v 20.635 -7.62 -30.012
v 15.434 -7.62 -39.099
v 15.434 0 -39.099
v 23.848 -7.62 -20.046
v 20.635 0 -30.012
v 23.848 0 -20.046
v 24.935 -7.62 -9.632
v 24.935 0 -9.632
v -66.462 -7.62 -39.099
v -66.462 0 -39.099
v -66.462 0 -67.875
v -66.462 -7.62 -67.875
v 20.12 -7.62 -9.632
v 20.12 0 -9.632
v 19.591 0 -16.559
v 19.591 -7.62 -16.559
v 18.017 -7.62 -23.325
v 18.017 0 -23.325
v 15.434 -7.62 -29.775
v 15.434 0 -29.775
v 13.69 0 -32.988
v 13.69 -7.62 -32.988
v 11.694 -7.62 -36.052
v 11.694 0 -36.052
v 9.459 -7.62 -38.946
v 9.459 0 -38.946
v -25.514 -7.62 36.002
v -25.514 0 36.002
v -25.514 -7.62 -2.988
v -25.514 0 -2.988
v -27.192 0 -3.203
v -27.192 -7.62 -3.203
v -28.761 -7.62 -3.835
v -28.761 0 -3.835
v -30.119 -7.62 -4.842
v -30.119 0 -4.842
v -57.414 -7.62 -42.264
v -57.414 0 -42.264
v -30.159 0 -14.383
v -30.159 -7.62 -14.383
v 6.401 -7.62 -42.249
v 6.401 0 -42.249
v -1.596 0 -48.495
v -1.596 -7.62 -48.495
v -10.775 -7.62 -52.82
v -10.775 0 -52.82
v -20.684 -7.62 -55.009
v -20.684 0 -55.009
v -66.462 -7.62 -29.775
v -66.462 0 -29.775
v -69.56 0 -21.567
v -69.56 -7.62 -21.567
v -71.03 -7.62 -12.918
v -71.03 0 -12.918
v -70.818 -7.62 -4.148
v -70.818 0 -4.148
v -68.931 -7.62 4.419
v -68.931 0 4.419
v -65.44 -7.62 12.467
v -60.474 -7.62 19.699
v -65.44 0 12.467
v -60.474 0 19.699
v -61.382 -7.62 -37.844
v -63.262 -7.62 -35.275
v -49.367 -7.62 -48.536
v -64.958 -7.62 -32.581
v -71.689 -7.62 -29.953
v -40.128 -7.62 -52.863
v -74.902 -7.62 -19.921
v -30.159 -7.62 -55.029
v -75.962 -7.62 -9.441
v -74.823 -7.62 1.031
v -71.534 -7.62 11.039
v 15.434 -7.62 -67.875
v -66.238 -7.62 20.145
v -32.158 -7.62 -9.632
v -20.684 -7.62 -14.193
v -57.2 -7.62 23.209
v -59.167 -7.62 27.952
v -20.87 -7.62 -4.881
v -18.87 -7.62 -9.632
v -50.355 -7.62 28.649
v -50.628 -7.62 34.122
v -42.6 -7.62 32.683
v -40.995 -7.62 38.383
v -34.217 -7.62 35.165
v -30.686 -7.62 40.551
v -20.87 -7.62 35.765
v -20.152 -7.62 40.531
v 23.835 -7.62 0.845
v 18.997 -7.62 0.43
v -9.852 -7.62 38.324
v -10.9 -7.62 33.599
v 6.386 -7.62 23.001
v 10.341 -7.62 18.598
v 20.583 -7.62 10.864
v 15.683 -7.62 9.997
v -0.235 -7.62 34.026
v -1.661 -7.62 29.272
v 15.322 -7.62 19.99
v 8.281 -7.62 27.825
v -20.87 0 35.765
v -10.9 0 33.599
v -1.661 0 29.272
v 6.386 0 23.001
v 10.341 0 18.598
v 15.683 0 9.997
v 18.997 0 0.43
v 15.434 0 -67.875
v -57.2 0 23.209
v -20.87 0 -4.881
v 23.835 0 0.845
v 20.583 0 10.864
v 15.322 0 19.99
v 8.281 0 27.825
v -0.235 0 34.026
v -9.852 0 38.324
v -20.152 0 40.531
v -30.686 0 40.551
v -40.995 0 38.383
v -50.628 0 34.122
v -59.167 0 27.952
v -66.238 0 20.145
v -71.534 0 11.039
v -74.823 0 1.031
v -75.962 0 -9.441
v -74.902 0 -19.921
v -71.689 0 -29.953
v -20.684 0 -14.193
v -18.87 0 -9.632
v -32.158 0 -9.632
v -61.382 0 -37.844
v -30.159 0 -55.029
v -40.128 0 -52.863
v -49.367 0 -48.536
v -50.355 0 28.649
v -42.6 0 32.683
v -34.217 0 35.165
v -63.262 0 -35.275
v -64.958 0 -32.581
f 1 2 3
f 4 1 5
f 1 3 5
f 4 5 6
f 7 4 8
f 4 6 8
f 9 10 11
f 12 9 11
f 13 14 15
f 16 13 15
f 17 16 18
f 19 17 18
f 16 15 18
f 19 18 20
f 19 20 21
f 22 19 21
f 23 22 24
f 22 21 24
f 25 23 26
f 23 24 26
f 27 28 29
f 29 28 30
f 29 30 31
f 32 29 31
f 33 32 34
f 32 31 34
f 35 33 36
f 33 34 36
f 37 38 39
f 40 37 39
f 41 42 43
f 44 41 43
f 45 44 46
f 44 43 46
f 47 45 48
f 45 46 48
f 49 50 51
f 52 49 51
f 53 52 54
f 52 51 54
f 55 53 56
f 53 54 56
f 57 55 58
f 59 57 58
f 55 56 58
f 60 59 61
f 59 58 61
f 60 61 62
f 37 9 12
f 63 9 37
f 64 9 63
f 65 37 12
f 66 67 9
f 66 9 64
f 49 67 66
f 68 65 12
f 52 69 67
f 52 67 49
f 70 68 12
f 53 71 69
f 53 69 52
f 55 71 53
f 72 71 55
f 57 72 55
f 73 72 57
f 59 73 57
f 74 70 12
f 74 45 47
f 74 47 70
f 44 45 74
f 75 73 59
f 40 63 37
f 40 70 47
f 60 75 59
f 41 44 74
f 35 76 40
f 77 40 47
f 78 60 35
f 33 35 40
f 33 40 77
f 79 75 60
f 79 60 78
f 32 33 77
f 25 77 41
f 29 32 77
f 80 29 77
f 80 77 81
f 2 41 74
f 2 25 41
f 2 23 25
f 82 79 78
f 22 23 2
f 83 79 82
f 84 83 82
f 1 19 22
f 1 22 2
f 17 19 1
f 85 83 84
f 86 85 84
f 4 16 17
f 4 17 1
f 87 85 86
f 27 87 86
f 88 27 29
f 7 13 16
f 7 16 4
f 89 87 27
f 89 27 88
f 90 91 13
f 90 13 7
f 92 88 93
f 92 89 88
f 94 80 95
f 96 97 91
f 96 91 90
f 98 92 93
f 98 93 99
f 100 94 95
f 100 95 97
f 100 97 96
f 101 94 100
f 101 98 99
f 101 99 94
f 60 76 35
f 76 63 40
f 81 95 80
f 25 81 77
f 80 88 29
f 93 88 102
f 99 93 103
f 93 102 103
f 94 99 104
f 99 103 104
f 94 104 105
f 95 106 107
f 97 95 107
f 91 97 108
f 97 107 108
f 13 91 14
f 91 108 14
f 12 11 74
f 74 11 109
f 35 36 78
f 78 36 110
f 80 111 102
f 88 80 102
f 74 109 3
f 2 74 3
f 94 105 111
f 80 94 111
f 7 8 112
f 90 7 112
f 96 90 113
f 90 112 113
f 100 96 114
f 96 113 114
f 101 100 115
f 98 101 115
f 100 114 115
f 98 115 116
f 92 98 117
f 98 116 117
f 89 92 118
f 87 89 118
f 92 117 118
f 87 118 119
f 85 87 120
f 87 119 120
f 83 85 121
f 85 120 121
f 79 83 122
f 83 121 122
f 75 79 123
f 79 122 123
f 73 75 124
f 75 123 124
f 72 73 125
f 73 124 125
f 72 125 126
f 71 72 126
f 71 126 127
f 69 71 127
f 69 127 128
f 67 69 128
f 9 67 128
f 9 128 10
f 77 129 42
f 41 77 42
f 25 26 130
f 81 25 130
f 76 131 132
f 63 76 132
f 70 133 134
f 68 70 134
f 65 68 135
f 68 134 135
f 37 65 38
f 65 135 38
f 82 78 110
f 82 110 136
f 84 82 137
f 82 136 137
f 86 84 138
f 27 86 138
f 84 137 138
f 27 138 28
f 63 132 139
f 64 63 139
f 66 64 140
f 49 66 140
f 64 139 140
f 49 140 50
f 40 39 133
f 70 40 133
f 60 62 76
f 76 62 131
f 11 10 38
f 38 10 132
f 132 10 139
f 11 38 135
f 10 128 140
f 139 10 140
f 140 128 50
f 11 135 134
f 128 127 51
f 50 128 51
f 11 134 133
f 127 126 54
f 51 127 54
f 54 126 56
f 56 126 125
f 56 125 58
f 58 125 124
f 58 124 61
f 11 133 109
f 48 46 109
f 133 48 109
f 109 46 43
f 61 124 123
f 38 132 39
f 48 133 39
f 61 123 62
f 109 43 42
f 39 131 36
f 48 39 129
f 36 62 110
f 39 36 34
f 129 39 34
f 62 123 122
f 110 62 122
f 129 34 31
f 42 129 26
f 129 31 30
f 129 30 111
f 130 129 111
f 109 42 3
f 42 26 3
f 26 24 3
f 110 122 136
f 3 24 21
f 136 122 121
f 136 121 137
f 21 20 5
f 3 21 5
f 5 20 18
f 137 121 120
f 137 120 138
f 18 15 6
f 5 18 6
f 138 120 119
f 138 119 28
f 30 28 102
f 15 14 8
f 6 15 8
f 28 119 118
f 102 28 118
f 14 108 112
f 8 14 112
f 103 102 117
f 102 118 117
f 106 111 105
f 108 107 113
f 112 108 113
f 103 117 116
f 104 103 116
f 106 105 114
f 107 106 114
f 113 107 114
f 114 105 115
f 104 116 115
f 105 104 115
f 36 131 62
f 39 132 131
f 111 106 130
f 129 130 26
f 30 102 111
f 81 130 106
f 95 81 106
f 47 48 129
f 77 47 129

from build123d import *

# Parameters (mm, degrees)
F1_DEPTH = 7.62


# Not quite as in the source:
# - a feature names something its author has since deleted; it is built from what else it names


with BuildPart() as f1:
    # F0 (on Front) → F1 (new body)
    with BuildSketch(Plane.XZ):
        with BuildLine():
            ThreePointArc((10.3407477596, 18.5977799931), (17.6059784875, 5.3059692522), (20.1200594207, -9.6317416622))
            ThreePointArc((20.1200594207, -9.6317416622), (18.9331000604, -19.9720923089), (15.4339684141, -29.7745308699))
            Line((15.4339684141, -29.7745308699), (15.4339684141, -39.0992002321))
            ThreePointArc((15.4339684141, -39.0992002321), (22.5007653243, -25.1123260967), (24.9346453986, -9.6317416622))
            ThreePointArc((24.9346453986, -9.6317416622), (-40.9946586007, 38.3830978282), (-66.4621167465, -39.0992002321))
            Line((-66.4621167465, -39.0992002321), (-66.4621167465, -29.7745308699))
            ThreePointArc((-66.4621167465, -29.7745308699), (-70.8175510234, -4.1482087801), (-60.473849015, 19.6989298396))
            ThreePointArc((-60.473849015, 19.6989298396), (-58.8829140283, 21.49693763), (-57.1996202187, 23.2087869508))
            ThreePointArc((-57.1996202187, 23.2087869508), (-42.5995223376, 32.6832865075), (-25.5140741662, 36.0023919246))
            ThreePointArc((-25.5140741662, 36.0023919246), (-23.1888304756, 35.9431131373), (-20.869627773, 35.7654307819))
            ThreePointArc((-20.869627773, 35.7654307819), (-6.1592475305, 31.6945796612), (6.3859014459, 23.0005384324))
            ThreePointArc((6.3859014459, 23.0005384324), (8.4347729102, 20.8633387673), (10.3407477596, 18.5977799931))
        make_face()
        with BuildLine():
            Line((15.4339684141, -39.0992002321), (15.4339684141, -29.7745308699))
            ThreePointArc((15.4339684141, -29.7745308699), (12.7227075108, -34.5400269346), (9.459491795, -38.9459674269))
            ThreePointArc((9.459491795, -38.9459674269), (7.971092144, -40.635254131), (6.4011850797, -42.2490741021))
            ThreePointArc((6.4011850797, -42.2490741021), (-6.064908215, -50.9137485421), (-20.6835588609, -55.0094924892))
            ThreePointArc((-20.6835588609, -55.0094924892), (-25.4205342826, -55.265779381), (-30.1585205594, -55.0289141064))
            ThreePointArc((-30.1585205594, -55.0289141064), (-44.8689008019, -50.9580629857), (-57.4140497783, -42.2640217569))
            ThreePointArc((-57.4140497783, -42.2640217569), (-59.4700632753, -40.1188693041), (-61.3821167465, -37.8444634324))
            ThreePointArc((-61.3821167465, -37.8444634324), (-64.1334823406, -33.9425512021), (-66.4621167465, -29.7745308699))
            Line((-66.4621167465, -29.7745308699), (-66.4621167465, -39.0992002321))
            ThreePointArc((-66.4621167465, -39.0992002321), (-25.5140741662, -60.0804612271), (15.4339684141, -39.0992002321))
        make_face()
        with BuildLine():
            Line((15.4339684141, -55.2114608665), (15.4339684141, -39.0992002321))
            ThreePointArc((15.4339684141, -39.0992002321), (-25.5140741662, -60.0804612271), (-66.4621167465, -39.0992002321))
            Line((-66.4621167465, -39.0992002321), (-66.4621167465, -58.9845308699))
            Line((-66.4621167465, -58.9845308699), (-66.4621167465, -67.8745308699))
            Line((-66.4621167465, -67.8745308699), (15.4339684141, -67.8745308699))
            Line((15.4339684141, -67.8745308699), (15.4339684141, -58.9845308699))
            Line((15.4339684141, -58.9845308699), (15.4339684141, -55.2114608665))
        make_face()
        with BuildLine():
            Line((-30.119077868, -4.8424361606), (-57.1996202187, 23.2087869508))
            ThreePointArc((-57.1996202187, 23.2087869508), (-58.8829140283, 21.49693763), (-60.473849015, 19.6989298396))
            Line((-60.473849015, 19.6989298396), (-32.1581321342, -9.6317416622))
            ThreePointArc((-32.1581321342, -9.6317416622), (-31.6271510436, -7.0290896739), (-30.119077868, -4.8424361606))
        make_face()
        with BuildLine():
            Line((-57.4140497783, -42.2640217569), (-30.1585205594, -14.3828072251))
            ThreePointArc((-30.1585205594, -14.3828072251), (-31.6378588353, -12.2090983718), (-32.1581321342, -9.6317416622))
            Line((-32.1581321342, -9.6317416622), (-61.3821167465, -37.8444634324))
            ThreePointArc((-61.3821167465, -37.8444634324), (-59.4700632753, -40.1188693041), (-57.4140497783, -42.2640217569))
        make_face()
        with BuildLine():
            Line((-20.6835588609, -55.0094924892), (-20.6835588609, -14.1934987981))
            ThreePointArc((-20.6835588609, -14.1934987981), (-25.3813532931, -16.2744738901), (-30.1585205594, -14.3828072251))
            Line((-30.1585205594, -14.3828072251), (-30.1585205594, -55.0289141064))
            ThreePointArc((-30.1585205594, -55.0289141064), (-25.4205342826, -55.265779381), (-20.6835588609, -55.0094924892))
        make_face()
        with BuildLine():
            Line((-18.8700161982, -9.6317416622), (10.3407477596, 18.5977799931))
            ThreePointArc((10.3407477596, 18.5977799931), (8.4347729102, 20.8633387673), (6.3859014459, 23.0005384324))
            Line((6.3859014459, 23.0005384324), (-20.869627773, -4.8806760994))
            ThreePointArc((-20.869627773, -4.8806760994), (-19.3902894971, -7.0543849527), (-18.8700161982, -9.6317416622))
        make_face()
        with BuildLine():
            Line((-20.869627773, -4.8806760994), (-20.869627773, 35.7654307819))
            ThreePointArc((-20.869627773, 35.7654307819), (-23.1888304756, 35.9431131373), (-25.5140741662, 36.0023919246))
            Line((-25.5140741662, 36.0023919246), (-25.5140741662, -2.9876836943))
            ThreePointArc((-25.5140741662, -2.9876836943), (-23.006370907, -3.4791055894), (-20.869627773, -4.8806760994))
        make_face()
        with BuildLine():
            ThreePointArc((-20.6835588609, -14.1934987981), (-19.340026467, -12.0862561334), (-18.8700161982, -9.6317416622))
            ThreePointArc((-18.8700161982, -9.6317416622), (-19.3902894971, -7.0543849527), (-20.869627773, -4.8806760994))
            ThreePointArc((-20.869627773, -4.8806760994), (-23.006370907, -3.4791055894), (-25.5140741662, -2.9876836943))
            ThreePointArc((-25.5140741662, -2.9876836943), (-27.9963194101, -3.4687906783), (-30.119077868, -4.8424361606))
            ThreePointArc((-30.119077868, -4.8424361606), (-31.6271510436, -7.0290896739), (-32.1581321342, -9.6317416622))
            ThreePointArc((-32.1581321342, -9.6317416622), (-31.6378588353, -12.2090983718), (-30.1585205594, -14.3828072251))
            ThreePointArc((-30.1585205594, -14.3828072251), (-25.3813532931, -16.2744738901), (-20.6835588609, -14.1934987981))
        make_face()
        with BuildLine():
            Line((9.459491795, -38.9459674269), (-18.8700161982, -9.6317416622))
            ThreePointArc((-18.8700161982, -9.6317416622), (-19.340026467, -12.0862561334), (-20.6835588609, -14.1934987981))
            Line((-20.6835588609, -14.1934987981), (6.4011850797, -42.2490741021))
            ThreePointArc((6.4011850797, -42.2490741021), (7.971092144, -40.635254131), (9.459491795, -38.9459674269))
        make_face()
    extrude(amount=F1_DEPTH)


solid = f1.part
